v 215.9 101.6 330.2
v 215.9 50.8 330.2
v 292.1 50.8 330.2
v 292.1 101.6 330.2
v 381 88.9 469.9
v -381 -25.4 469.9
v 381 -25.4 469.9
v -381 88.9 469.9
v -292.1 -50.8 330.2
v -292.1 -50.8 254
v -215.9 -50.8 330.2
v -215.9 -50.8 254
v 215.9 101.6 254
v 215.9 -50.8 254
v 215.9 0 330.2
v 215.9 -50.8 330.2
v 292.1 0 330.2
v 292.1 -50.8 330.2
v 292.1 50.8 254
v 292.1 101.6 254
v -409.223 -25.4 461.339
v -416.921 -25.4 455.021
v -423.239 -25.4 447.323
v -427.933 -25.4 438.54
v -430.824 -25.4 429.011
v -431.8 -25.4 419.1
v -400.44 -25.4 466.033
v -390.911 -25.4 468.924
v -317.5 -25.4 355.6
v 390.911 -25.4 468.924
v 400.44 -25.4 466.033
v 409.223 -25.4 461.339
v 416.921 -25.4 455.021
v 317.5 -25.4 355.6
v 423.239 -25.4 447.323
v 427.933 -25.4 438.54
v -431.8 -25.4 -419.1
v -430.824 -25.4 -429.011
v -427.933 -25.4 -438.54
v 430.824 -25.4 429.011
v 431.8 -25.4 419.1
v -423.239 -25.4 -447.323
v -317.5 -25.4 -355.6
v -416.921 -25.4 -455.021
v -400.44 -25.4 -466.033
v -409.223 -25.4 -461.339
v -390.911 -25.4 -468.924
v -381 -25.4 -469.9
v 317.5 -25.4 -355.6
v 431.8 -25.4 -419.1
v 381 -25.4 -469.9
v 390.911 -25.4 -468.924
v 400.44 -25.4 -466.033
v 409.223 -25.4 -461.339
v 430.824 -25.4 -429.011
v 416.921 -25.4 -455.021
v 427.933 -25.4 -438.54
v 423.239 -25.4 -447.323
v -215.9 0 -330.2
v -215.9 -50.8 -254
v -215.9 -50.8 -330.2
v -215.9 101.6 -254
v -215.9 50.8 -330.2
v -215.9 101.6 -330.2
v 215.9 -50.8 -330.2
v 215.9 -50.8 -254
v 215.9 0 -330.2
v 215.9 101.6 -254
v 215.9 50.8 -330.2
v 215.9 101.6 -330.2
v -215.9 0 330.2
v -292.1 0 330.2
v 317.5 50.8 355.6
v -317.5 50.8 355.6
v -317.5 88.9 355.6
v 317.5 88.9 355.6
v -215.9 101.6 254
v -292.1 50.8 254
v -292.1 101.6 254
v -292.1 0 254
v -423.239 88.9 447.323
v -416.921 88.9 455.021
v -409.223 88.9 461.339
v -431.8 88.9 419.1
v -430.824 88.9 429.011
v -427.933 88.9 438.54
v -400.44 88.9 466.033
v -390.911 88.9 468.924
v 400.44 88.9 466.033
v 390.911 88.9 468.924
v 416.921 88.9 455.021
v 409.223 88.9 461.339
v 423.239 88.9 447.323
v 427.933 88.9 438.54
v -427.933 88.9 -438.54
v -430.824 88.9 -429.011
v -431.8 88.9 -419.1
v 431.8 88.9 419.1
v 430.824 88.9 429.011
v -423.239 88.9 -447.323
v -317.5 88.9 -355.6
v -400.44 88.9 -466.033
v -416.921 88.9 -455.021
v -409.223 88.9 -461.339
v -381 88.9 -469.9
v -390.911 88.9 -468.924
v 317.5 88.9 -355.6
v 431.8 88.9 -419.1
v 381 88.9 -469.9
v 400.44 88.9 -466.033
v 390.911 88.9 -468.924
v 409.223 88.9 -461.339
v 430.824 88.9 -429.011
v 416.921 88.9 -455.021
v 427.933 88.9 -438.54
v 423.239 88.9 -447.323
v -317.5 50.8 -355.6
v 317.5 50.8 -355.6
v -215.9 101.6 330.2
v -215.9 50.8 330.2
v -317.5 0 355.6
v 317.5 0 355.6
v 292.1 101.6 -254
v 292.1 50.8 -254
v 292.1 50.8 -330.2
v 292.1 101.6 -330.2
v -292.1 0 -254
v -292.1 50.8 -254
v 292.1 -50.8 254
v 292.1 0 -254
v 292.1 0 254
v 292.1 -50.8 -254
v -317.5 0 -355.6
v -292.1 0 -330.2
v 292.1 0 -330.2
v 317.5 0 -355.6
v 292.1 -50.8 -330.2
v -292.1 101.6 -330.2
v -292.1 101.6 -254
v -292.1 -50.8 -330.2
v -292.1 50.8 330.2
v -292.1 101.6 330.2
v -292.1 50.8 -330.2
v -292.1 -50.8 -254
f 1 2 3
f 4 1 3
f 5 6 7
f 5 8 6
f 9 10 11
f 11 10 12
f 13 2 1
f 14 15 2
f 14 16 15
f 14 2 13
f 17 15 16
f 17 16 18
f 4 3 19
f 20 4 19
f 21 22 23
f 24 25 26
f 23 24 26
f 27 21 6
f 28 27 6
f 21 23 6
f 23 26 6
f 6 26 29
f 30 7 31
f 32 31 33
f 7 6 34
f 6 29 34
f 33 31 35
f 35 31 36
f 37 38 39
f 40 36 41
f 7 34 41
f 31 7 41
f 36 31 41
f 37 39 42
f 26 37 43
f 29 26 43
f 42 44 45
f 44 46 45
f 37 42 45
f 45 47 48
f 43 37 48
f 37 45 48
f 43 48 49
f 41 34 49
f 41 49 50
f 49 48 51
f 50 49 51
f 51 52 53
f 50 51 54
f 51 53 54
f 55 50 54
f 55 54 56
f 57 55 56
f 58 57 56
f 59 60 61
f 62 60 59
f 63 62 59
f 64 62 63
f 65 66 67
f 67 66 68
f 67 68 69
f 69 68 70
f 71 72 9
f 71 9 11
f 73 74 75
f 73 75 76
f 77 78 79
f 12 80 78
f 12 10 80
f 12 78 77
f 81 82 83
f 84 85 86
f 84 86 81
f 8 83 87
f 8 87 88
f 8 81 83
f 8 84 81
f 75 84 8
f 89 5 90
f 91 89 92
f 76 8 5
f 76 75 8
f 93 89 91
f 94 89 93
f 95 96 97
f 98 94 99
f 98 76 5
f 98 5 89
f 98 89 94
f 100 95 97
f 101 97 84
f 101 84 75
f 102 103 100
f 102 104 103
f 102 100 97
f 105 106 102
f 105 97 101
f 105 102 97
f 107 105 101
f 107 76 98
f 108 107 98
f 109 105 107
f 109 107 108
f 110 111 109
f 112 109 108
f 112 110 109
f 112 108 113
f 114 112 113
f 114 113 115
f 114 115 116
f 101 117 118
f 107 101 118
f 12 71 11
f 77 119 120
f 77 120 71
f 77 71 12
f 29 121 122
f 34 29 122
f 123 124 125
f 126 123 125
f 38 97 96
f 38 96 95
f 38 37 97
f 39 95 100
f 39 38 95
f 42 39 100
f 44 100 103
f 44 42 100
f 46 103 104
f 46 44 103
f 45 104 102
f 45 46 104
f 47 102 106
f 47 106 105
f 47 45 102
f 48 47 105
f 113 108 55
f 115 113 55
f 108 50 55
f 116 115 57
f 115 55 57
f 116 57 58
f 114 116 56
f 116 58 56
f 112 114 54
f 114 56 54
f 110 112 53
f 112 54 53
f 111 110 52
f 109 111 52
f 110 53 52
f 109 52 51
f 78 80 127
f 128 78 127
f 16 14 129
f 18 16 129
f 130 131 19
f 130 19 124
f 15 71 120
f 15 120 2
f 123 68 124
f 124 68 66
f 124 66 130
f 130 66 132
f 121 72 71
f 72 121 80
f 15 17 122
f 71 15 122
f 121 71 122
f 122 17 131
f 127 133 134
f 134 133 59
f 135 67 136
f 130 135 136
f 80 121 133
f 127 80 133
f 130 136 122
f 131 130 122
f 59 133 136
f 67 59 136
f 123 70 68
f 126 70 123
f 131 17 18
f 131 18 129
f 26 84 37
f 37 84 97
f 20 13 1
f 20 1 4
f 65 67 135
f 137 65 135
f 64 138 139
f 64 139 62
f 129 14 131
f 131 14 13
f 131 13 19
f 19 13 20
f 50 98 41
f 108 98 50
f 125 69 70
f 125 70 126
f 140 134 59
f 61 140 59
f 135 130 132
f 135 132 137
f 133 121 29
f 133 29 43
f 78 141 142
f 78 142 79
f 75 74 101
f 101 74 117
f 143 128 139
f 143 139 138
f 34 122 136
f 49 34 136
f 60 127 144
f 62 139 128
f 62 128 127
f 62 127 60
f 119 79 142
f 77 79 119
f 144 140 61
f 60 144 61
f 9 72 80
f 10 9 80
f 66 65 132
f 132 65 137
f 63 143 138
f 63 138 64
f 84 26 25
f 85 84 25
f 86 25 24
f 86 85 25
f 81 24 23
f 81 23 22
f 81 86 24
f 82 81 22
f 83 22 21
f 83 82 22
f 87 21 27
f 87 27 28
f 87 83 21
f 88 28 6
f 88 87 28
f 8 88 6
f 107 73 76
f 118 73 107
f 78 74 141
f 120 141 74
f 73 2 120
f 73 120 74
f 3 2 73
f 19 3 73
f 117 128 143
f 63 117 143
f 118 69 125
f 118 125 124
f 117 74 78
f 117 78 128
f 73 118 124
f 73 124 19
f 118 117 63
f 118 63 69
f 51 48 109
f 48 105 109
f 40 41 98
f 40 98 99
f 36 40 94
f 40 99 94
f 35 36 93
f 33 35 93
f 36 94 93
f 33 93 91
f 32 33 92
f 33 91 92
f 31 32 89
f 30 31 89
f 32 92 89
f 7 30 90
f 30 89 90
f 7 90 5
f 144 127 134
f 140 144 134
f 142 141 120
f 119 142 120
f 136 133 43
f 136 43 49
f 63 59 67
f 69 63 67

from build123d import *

# Parameters (mm, degrees)
SKETCH1_W                = 635
SKETCH1_H                = 711.2
SKETCH1_W_2              = 584.2
SKETCH1_H_2              = 660.4
BOSS_EXTRUDE2_DEPTH      = 50.8
SKETCH1_3_W              = 76.2
SKETCH1_3_H              = 76.2
BOSS_EXTRUDE3_DEPTH      = 101.6
BOSS_EXTRUDE3_DEPTH_BACK = 50.8
SKETCH3_W                = 863.6
SKETCH3_H                = 939.8
SKETCH3_W_2              = 635
SKETCH3_H_2              = 711.2
BOSS_EXTRUDE4_DEPTH      = 88.9
BOSS_EXTRUDE4_DEPTH_BACK = 25.4
FILLET1_R                = 50.8


with BuildPart() as part:
    # Sketch1 → Boss-Extrude2 (new body)
    with BuildSketch(Plane(origin=(0, 0, 0), x_dir=(1, 0, 0), z_dir=(0, 1, 0))):
        Rectangle(SKETCH1_W, SKETCH1_H)
        Rectangle(SKETCH1_W_2, SKETCH1_H_2, mode=Mode.SUBTRACT)
    extrude(amount=BOSS_EXTRUDE2_DEPTH)

    # Sketch1<3> → Boss-Extrude3 (add, two sides)
    with BuildSketch(Plane(origin=(0, 0, 0), x_dir=(1, 0, 0), z_dir=(0, 1, 0))) as boss_extrude3_sk:
        with Locations((-254, 292.1)):
            Rectangle(SKETCH1_3_W, SKETCH1_3_H)
        with Locations((254, 292.1)):
            Rectangle(SKETCH1_3_W, SKETCH1_3_H)
        with Locations((254, -292.1)):
            Rectangle(SKETCH1_3_W, SKETCH1_3_H)
        with Locations((-254, -292.1)):
            Rectangle(SKETCH1_3_W, SKETCH1_3_H)
    extrude(amount=BOSS_EXTRUDE3_DEPTH)
    extrude(boss_extrude3_sk.sketch, amount=-BOSS_EXTRUDE3_DEPTH_BACK)

    # Sketch3 → Boss-Extrude4 (add, two sides)
    with BuildSketch(Plane(origin=(0, 0, 0), x_dir=(1, 0, 0), z_dir=(0, 1, 0))) as boss_extrude4_sk:
        Rectangle(SKETCH3_W, SKETCH3_H)
        Rectangle(SKETCH3_W_2, SKETCH3_H_2, mode=Mode.SUBTRACT)
    extrude(amount=BOSS_EXTRUDE4_DEPTH)
    extrude(boss_extrude4_sk.sketch, amount=-BOSS_EXTRUDE4_DEPTH_BACK)

    # Fillet1
    fillet1_edges = [part.edges().sort_by_distance(p)[0] for p in [
        (-431.8, 31.75, 469.9),
        (-431.8, 31.75, -469.9),
        (431.8, 31.75, -469.9),
        (431.8, 31.75, 469.9),
    ]]
    fillet(fillet1_edges, radius=FILLET1_R)


solid = part.part
